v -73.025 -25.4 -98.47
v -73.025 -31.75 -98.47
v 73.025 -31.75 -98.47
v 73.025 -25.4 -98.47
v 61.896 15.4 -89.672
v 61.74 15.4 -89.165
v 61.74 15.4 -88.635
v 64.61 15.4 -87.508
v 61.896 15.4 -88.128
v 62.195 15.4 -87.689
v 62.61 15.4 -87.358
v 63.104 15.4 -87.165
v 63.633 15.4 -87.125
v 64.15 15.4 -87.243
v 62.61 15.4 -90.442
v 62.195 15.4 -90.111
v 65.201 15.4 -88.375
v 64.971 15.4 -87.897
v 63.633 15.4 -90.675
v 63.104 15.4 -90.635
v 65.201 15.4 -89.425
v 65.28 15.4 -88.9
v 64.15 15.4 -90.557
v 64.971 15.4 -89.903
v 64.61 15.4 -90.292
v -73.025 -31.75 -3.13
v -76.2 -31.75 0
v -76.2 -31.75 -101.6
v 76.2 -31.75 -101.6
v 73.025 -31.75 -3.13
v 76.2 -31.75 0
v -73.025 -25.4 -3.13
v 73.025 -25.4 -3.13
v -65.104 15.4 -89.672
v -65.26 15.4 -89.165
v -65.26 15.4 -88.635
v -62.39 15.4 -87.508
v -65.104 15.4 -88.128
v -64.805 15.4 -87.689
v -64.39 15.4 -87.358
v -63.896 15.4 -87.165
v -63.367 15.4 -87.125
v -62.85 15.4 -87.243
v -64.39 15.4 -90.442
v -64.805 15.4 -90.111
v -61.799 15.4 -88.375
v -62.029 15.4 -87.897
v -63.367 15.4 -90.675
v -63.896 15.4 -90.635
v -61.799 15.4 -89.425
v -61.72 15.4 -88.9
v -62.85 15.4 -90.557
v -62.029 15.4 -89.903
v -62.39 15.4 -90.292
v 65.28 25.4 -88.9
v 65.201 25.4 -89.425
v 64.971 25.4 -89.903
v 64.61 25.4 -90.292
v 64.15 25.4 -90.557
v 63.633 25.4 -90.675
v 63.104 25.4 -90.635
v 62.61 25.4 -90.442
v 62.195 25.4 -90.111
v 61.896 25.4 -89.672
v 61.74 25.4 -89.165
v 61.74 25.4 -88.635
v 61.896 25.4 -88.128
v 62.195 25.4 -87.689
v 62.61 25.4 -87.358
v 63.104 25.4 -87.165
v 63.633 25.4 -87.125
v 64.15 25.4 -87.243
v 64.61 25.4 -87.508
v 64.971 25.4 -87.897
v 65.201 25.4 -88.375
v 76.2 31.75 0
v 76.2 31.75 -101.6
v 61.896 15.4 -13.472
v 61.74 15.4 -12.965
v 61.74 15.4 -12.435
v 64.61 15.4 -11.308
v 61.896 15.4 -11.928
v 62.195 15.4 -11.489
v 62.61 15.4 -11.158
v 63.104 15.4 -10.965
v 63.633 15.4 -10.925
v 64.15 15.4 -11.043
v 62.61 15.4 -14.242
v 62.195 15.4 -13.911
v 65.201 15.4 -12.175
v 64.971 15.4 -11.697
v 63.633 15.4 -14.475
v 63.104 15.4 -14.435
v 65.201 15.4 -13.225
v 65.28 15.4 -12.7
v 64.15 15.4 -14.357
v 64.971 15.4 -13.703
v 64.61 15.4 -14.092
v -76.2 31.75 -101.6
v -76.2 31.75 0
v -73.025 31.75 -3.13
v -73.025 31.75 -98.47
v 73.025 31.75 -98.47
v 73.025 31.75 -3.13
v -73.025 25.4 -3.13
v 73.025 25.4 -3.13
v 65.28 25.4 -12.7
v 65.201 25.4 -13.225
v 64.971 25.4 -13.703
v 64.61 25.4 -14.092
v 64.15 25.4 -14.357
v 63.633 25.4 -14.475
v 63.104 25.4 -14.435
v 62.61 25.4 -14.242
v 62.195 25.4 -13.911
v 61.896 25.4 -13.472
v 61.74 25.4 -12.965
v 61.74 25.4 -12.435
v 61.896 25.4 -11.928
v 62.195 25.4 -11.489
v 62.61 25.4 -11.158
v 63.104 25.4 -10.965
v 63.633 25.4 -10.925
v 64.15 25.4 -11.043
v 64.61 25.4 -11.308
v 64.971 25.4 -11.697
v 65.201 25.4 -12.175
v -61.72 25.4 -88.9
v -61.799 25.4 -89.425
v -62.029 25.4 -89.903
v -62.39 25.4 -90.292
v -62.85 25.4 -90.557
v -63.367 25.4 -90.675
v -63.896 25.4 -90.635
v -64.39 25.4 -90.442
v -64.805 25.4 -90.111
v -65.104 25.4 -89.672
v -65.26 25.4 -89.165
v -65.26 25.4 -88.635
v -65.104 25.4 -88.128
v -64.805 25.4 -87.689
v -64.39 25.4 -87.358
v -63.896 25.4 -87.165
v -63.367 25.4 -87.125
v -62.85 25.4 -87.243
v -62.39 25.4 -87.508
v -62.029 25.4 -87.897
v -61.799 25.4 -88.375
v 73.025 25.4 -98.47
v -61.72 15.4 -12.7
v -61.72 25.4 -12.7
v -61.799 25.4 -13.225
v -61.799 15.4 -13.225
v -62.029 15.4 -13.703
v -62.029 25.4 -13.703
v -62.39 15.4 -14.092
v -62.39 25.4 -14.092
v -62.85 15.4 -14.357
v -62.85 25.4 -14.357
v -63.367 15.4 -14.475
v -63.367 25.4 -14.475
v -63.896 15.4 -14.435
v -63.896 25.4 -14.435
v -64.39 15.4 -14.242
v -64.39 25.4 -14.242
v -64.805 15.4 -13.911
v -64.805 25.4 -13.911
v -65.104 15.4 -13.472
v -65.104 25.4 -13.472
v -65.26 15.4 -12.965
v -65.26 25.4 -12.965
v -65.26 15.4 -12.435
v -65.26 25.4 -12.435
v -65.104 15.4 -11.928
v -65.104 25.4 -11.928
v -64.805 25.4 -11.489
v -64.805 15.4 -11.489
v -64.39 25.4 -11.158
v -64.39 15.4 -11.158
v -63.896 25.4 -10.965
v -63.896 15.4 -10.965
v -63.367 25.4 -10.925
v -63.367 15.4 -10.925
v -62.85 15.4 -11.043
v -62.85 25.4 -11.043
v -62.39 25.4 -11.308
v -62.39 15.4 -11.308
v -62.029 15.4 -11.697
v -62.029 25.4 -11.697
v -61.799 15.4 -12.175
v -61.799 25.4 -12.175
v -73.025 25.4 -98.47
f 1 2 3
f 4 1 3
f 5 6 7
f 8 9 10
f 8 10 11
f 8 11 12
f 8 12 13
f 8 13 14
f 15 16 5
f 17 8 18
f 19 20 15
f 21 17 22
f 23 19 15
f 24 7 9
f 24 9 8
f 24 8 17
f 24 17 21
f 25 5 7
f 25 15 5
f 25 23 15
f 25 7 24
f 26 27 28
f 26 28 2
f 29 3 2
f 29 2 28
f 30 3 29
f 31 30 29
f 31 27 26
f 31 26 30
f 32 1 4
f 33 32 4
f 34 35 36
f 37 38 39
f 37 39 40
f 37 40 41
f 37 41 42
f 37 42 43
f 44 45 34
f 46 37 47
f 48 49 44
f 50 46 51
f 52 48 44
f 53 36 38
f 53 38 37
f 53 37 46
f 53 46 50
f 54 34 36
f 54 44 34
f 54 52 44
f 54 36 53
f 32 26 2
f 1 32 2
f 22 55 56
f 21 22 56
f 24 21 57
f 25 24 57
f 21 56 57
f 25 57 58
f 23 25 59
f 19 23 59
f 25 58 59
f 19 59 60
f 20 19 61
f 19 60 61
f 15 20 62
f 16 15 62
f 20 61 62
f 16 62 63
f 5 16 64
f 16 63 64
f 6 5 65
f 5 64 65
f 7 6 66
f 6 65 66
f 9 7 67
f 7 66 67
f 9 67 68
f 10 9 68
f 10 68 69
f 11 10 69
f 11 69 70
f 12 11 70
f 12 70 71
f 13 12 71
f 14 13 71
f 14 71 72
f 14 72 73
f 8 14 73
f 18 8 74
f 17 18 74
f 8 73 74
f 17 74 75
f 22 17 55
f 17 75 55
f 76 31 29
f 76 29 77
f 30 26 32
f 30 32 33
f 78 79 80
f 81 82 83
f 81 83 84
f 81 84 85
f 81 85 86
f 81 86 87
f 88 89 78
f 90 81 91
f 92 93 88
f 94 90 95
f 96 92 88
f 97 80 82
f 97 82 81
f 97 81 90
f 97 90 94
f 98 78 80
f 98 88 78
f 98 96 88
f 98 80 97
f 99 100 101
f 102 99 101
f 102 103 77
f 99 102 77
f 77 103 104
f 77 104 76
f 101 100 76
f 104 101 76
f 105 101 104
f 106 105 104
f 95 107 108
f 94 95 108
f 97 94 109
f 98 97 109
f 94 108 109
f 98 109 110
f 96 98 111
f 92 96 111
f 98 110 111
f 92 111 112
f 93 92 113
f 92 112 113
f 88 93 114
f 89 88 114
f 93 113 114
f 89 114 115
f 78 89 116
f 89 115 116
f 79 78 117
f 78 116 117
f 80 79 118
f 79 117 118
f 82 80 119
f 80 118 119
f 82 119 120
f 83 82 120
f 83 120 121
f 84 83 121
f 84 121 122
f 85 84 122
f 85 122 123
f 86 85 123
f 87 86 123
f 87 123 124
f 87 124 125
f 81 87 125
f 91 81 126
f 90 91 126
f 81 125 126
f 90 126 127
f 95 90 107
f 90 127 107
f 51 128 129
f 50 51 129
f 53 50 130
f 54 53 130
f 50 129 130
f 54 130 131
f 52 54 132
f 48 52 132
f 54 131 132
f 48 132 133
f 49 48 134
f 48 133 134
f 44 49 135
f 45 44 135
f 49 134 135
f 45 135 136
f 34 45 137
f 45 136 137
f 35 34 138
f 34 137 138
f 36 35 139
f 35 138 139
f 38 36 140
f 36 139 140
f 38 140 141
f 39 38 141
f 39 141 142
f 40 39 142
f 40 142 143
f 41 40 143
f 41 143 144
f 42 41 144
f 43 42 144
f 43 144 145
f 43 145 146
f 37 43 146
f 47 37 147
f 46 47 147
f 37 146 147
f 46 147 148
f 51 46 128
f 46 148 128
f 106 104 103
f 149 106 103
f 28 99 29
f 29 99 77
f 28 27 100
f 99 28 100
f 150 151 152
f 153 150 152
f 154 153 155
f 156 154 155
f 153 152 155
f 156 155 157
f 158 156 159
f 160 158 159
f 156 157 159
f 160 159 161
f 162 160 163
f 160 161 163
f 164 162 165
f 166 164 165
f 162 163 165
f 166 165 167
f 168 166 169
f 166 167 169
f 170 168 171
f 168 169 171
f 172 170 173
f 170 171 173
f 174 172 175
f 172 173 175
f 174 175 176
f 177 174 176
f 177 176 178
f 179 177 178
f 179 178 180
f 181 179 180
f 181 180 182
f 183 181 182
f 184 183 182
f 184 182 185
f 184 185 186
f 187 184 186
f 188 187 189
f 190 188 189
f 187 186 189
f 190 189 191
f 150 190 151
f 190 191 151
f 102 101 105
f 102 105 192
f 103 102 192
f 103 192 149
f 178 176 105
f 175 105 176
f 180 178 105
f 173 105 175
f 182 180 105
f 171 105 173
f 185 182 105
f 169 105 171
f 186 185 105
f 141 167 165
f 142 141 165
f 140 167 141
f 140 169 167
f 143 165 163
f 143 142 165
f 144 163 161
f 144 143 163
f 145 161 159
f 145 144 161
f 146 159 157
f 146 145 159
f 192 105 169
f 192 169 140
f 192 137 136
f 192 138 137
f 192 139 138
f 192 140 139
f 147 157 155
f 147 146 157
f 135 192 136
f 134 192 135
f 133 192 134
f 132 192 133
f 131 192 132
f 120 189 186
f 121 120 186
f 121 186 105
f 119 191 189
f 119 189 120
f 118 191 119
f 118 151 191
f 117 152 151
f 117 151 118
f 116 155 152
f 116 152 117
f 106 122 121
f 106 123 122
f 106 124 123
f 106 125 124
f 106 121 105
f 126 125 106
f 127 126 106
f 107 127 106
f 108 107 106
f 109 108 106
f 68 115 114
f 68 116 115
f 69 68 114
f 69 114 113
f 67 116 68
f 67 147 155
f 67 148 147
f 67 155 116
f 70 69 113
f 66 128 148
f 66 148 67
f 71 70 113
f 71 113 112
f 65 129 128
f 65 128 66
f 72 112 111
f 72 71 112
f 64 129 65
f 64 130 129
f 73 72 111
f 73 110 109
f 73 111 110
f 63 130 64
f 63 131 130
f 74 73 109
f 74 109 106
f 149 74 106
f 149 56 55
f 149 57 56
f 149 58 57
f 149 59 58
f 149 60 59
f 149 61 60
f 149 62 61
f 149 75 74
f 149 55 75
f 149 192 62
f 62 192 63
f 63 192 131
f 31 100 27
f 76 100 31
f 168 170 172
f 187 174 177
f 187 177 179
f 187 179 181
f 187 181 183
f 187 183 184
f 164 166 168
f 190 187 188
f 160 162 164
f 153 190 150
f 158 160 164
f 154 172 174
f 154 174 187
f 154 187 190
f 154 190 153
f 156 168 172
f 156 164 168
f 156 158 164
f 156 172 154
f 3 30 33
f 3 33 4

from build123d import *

# Parameters (mm, degrees)
SKETCH1_W           = 152.4
SKETCH1_H           = 63.5
BOSS_EXTRUDE1_DEPTH = 101.6
SKETCH3_W           = 146.05
SKETCH3_H           = 95.34
CUT_EXTRUDE1_DEPTH  = 6.35
SKETCH4_R           = 1.78
CUT_EXTRUDE2_DEPTH  = 10


with BuildPart() as part:
    # Sketch1 → Boss-Extrude1 (new body)
    with BuildSketch(Plane.XY):
        Rectangle(SKETCH1_W, SKETCH1_H)
    extrude(amount=-BOSS_EXTRUDE1_DEPTH)

    # Sketch3 → Cut-Extrude1 (cut)
    with BuildSketch(Plane(origin=(0, 31.75, 0), x_dir=(1, 0, 0), z_dir=(0, 1, 0))):
        with Locations((0, 50.8)):
            Rectangle(SKETCH3_W, SKETCH3_H)
    cut_extrude1 = extrude(amount=-CUT_EXTRUDE1_DEPTH, mode=Mode.SUBTRACT)

    # Mirror1: Cut-Extrude1 across plane
    add(cut_extrude1.mirror(Plane.ZX), mode=Mode.SUBTRACT)

    # Sketch4 → Cut-Extrude2 (cut)
    with BuildSketch(Plane(origin=(0, 25.4, 0), x_dir=(1, 0, 0), z_dir=(0, 1, 0))):
        with Locations((63.5, 88.9)):
            Circle(SKETCH4_R)
        with Locations((63.5, 12.7)):
            Circle(SKETCH4_R)
        with Locations((-63.5, 88.9)):
            Circle(SKETCH4_R)
        with Locations((-63.5, 12.7)):
            Circle(SKETCH4_R)
    extrude(amount=-CUT_EXTRUDE2_DEPTH, mode=Mode.SUBTRACT)


solid = part.part
